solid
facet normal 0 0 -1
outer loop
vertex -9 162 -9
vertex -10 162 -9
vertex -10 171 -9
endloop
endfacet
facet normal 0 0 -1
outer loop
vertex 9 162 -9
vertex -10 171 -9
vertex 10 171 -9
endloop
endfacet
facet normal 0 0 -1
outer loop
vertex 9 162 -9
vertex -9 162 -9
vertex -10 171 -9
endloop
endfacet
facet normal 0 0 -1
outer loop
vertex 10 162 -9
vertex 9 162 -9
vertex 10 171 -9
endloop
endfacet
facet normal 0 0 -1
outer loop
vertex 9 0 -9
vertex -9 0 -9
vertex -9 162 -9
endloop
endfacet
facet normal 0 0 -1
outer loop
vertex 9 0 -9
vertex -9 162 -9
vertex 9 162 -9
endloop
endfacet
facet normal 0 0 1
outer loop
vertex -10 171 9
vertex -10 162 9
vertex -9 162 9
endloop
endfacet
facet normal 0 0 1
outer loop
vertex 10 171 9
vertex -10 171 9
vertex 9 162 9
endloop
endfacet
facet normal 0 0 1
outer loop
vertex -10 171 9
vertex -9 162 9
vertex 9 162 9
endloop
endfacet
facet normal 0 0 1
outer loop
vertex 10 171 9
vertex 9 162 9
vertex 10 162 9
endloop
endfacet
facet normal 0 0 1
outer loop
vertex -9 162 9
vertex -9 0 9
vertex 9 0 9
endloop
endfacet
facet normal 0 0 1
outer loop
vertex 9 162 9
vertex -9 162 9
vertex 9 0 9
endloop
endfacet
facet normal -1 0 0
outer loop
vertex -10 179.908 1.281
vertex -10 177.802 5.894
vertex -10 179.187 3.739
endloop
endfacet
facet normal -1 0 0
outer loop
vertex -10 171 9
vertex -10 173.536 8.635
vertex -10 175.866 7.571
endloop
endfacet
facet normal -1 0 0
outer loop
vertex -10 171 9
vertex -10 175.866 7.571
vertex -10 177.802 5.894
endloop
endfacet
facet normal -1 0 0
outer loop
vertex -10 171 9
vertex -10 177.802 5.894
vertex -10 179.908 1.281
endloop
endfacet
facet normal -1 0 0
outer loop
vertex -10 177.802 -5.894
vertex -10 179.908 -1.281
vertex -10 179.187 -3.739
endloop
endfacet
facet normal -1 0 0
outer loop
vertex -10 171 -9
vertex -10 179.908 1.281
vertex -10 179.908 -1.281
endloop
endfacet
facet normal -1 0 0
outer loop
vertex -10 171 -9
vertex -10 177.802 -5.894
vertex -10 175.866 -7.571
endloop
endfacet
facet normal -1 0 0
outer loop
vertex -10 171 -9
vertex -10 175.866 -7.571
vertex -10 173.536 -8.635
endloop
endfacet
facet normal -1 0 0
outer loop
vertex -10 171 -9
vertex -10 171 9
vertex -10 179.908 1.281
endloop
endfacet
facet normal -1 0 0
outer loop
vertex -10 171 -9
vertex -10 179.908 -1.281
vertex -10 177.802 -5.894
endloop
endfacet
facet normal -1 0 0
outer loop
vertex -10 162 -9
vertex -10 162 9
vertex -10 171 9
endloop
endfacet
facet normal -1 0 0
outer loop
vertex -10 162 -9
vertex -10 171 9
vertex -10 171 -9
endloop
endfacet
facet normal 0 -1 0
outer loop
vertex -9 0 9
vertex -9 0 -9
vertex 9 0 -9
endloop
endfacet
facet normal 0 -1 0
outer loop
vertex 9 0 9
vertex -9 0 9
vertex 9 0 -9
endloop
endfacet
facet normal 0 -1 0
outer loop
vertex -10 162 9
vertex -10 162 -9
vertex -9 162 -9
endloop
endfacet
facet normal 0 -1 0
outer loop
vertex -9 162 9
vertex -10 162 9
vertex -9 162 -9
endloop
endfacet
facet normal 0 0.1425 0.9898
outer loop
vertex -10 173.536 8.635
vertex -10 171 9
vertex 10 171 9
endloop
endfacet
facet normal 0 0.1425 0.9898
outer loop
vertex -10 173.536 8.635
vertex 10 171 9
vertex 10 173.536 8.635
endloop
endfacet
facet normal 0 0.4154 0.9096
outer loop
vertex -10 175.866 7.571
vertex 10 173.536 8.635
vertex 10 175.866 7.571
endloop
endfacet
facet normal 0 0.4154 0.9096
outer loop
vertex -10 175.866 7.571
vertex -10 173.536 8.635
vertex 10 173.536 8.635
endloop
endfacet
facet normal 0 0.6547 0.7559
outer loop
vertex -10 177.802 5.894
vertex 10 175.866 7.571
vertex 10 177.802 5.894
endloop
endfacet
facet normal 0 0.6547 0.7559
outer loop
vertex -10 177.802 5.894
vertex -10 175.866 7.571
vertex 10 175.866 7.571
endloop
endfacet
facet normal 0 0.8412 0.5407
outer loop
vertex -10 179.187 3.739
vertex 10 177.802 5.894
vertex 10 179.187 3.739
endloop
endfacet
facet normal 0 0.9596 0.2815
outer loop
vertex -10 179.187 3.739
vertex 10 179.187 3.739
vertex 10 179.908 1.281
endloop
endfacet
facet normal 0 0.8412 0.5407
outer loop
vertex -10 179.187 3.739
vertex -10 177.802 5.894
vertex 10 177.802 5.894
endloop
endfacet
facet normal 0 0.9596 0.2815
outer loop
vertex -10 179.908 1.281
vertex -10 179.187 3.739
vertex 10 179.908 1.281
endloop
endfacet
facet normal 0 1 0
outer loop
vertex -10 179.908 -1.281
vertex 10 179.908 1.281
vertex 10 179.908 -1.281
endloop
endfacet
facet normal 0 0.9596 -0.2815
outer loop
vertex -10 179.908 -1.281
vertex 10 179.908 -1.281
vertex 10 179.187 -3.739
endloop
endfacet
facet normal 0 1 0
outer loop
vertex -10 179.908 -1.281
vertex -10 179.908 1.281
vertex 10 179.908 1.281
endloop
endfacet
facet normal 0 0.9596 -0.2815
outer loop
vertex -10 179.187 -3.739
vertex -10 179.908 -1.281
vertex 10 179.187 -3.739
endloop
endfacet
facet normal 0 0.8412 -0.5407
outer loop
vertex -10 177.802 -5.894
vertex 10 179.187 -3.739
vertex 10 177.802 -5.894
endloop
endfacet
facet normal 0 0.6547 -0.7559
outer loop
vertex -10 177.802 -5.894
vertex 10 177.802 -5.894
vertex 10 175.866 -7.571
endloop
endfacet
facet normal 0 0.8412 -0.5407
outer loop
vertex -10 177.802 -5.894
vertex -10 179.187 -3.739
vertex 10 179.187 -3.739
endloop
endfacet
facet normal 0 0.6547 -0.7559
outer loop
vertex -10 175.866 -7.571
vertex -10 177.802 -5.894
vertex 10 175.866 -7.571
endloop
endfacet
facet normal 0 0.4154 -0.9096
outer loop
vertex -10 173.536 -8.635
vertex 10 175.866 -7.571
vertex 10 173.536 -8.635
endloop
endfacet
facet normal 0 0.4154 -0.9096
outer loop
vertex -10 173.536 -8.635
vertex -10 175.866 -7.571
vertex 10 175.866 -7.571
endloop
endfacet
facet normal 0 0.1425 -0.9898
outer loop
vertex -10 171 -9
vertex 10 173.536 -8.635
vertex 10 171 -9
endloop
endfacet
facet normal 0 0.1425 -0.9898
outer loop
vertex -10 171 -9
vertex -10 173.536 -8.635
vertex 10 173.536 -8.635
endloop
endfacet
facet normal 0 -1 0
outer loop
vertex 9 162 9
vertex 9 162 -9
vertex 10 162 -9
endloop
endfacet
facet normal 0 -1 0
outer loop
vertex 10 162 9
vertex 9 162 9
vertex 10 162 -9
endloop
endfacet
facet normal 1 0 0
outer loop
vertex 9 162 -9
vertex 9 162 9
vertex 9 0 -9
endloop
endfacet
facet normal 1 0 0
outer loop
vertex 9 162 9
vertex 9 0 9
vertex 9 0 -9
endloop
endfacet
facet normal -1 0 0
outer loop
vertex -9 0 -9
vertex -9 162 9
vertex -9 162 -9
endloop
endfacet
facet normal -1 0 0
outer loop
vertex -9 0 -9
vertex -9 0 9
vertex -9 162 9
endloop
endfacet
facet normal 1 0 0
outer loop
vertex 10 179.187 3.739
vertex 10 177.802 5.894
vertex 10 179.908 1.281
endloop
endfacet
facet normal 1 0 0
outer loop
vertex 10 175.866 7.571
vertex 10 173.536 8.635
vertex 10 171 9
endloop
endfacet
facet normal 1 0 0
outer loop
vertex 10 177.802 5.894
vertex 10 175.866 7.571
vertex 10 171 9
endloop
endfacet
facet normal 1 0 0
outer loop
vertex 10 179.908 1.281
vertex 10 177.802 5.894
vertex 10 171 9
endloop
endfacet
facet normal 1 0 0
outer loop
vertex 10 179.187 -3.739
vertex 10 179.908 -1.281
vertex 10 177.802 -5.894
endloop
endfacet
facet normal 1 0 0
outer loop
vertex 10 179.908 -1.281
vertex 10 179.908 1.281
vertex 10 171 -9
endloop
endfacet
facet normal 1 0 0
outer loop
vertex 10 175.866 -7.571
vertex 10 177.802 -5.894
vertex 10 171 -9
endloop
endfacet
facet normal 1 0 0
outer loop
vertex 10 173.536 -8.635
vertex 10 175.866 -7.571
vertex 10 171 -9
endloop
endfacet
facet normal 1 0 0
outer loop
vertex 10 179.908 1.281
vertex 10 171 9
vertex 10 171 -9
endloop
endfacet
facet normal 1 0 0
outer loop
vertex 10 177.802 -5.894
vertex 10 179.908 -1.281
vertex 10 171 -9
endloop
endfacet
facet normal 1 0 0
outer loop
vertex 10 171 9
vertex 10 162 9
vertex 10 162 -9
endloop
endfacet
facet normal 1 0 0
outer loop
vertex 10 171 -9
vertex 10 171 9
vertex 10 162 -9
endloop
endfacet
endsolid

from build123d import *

# Parameters (mm, degrees)
SKETCH_1_W          = 18
SKETCH_1_H          = 18
EXTRUDE_1_DEPTH     = 160
SKETCH_2_W          = 18
SKETCH_2_H          = 18
EXTRUDE_2_DEPTH     = 2
SKETCH_3_W          = 20
SKETCH_3_H          = 18
EXTRUDE_4_DEPTH     = 18
CUT_EXTRUDE_1_DEPTH = 21


with BuildPart() as part:
    # 草图1 → 凸台-拉伸1 (new body)
    with BuildSketch(Plane(origin=(0, 0, 0), x_dir=(1, 0, 0), z_dir=(0, 1, 0))):
        Rectangle(SKETCH_1_W, SKETCH_1_H)
    extrude(amount=EXTRUDE_1_DEPTH)

    # 草图2 → 凸台-拉伸2 (add)
    with BuildSketch(Plane(origin=(0, 160, 0), x_dir=(1, 0, 0), z_dir=(0, 1, 0))):
        Rectangle(SKETCH_2_W, SKETCH_2_H)
    extrude(amount=EXTRUDE_2_DEPTH)

    # 草图3 → 凸台-拉伸4 (add)
    with BuildSketch(Plane(origin=(0, 162, 0), x_dir=(1, 0, 0), z_dir=(0, 1, 0))):
        Rectangle(SKETCH_3_W, SKETCH_3_H)
    extrude(amount=EXTRUDE_4_DEPTH)

    # 草图4 → 切除-拉伸1 (cut, through all)
    with BuildSketch(Plane.ZY.offset(10)):
        with BuildLine():
            Line((-9, 171), (-9, 185))
            Line((-9, 185), (9, 185))
            Line((9, 185), (9, 171))
            ThreePointArc((9, 171), (0, 180), (-9, 171))
        make_face()
    extrude(amount=-CUT_EXTRUDE_1_DEPTH, mode=Mode.SUBTRACT)


solid = part.part
